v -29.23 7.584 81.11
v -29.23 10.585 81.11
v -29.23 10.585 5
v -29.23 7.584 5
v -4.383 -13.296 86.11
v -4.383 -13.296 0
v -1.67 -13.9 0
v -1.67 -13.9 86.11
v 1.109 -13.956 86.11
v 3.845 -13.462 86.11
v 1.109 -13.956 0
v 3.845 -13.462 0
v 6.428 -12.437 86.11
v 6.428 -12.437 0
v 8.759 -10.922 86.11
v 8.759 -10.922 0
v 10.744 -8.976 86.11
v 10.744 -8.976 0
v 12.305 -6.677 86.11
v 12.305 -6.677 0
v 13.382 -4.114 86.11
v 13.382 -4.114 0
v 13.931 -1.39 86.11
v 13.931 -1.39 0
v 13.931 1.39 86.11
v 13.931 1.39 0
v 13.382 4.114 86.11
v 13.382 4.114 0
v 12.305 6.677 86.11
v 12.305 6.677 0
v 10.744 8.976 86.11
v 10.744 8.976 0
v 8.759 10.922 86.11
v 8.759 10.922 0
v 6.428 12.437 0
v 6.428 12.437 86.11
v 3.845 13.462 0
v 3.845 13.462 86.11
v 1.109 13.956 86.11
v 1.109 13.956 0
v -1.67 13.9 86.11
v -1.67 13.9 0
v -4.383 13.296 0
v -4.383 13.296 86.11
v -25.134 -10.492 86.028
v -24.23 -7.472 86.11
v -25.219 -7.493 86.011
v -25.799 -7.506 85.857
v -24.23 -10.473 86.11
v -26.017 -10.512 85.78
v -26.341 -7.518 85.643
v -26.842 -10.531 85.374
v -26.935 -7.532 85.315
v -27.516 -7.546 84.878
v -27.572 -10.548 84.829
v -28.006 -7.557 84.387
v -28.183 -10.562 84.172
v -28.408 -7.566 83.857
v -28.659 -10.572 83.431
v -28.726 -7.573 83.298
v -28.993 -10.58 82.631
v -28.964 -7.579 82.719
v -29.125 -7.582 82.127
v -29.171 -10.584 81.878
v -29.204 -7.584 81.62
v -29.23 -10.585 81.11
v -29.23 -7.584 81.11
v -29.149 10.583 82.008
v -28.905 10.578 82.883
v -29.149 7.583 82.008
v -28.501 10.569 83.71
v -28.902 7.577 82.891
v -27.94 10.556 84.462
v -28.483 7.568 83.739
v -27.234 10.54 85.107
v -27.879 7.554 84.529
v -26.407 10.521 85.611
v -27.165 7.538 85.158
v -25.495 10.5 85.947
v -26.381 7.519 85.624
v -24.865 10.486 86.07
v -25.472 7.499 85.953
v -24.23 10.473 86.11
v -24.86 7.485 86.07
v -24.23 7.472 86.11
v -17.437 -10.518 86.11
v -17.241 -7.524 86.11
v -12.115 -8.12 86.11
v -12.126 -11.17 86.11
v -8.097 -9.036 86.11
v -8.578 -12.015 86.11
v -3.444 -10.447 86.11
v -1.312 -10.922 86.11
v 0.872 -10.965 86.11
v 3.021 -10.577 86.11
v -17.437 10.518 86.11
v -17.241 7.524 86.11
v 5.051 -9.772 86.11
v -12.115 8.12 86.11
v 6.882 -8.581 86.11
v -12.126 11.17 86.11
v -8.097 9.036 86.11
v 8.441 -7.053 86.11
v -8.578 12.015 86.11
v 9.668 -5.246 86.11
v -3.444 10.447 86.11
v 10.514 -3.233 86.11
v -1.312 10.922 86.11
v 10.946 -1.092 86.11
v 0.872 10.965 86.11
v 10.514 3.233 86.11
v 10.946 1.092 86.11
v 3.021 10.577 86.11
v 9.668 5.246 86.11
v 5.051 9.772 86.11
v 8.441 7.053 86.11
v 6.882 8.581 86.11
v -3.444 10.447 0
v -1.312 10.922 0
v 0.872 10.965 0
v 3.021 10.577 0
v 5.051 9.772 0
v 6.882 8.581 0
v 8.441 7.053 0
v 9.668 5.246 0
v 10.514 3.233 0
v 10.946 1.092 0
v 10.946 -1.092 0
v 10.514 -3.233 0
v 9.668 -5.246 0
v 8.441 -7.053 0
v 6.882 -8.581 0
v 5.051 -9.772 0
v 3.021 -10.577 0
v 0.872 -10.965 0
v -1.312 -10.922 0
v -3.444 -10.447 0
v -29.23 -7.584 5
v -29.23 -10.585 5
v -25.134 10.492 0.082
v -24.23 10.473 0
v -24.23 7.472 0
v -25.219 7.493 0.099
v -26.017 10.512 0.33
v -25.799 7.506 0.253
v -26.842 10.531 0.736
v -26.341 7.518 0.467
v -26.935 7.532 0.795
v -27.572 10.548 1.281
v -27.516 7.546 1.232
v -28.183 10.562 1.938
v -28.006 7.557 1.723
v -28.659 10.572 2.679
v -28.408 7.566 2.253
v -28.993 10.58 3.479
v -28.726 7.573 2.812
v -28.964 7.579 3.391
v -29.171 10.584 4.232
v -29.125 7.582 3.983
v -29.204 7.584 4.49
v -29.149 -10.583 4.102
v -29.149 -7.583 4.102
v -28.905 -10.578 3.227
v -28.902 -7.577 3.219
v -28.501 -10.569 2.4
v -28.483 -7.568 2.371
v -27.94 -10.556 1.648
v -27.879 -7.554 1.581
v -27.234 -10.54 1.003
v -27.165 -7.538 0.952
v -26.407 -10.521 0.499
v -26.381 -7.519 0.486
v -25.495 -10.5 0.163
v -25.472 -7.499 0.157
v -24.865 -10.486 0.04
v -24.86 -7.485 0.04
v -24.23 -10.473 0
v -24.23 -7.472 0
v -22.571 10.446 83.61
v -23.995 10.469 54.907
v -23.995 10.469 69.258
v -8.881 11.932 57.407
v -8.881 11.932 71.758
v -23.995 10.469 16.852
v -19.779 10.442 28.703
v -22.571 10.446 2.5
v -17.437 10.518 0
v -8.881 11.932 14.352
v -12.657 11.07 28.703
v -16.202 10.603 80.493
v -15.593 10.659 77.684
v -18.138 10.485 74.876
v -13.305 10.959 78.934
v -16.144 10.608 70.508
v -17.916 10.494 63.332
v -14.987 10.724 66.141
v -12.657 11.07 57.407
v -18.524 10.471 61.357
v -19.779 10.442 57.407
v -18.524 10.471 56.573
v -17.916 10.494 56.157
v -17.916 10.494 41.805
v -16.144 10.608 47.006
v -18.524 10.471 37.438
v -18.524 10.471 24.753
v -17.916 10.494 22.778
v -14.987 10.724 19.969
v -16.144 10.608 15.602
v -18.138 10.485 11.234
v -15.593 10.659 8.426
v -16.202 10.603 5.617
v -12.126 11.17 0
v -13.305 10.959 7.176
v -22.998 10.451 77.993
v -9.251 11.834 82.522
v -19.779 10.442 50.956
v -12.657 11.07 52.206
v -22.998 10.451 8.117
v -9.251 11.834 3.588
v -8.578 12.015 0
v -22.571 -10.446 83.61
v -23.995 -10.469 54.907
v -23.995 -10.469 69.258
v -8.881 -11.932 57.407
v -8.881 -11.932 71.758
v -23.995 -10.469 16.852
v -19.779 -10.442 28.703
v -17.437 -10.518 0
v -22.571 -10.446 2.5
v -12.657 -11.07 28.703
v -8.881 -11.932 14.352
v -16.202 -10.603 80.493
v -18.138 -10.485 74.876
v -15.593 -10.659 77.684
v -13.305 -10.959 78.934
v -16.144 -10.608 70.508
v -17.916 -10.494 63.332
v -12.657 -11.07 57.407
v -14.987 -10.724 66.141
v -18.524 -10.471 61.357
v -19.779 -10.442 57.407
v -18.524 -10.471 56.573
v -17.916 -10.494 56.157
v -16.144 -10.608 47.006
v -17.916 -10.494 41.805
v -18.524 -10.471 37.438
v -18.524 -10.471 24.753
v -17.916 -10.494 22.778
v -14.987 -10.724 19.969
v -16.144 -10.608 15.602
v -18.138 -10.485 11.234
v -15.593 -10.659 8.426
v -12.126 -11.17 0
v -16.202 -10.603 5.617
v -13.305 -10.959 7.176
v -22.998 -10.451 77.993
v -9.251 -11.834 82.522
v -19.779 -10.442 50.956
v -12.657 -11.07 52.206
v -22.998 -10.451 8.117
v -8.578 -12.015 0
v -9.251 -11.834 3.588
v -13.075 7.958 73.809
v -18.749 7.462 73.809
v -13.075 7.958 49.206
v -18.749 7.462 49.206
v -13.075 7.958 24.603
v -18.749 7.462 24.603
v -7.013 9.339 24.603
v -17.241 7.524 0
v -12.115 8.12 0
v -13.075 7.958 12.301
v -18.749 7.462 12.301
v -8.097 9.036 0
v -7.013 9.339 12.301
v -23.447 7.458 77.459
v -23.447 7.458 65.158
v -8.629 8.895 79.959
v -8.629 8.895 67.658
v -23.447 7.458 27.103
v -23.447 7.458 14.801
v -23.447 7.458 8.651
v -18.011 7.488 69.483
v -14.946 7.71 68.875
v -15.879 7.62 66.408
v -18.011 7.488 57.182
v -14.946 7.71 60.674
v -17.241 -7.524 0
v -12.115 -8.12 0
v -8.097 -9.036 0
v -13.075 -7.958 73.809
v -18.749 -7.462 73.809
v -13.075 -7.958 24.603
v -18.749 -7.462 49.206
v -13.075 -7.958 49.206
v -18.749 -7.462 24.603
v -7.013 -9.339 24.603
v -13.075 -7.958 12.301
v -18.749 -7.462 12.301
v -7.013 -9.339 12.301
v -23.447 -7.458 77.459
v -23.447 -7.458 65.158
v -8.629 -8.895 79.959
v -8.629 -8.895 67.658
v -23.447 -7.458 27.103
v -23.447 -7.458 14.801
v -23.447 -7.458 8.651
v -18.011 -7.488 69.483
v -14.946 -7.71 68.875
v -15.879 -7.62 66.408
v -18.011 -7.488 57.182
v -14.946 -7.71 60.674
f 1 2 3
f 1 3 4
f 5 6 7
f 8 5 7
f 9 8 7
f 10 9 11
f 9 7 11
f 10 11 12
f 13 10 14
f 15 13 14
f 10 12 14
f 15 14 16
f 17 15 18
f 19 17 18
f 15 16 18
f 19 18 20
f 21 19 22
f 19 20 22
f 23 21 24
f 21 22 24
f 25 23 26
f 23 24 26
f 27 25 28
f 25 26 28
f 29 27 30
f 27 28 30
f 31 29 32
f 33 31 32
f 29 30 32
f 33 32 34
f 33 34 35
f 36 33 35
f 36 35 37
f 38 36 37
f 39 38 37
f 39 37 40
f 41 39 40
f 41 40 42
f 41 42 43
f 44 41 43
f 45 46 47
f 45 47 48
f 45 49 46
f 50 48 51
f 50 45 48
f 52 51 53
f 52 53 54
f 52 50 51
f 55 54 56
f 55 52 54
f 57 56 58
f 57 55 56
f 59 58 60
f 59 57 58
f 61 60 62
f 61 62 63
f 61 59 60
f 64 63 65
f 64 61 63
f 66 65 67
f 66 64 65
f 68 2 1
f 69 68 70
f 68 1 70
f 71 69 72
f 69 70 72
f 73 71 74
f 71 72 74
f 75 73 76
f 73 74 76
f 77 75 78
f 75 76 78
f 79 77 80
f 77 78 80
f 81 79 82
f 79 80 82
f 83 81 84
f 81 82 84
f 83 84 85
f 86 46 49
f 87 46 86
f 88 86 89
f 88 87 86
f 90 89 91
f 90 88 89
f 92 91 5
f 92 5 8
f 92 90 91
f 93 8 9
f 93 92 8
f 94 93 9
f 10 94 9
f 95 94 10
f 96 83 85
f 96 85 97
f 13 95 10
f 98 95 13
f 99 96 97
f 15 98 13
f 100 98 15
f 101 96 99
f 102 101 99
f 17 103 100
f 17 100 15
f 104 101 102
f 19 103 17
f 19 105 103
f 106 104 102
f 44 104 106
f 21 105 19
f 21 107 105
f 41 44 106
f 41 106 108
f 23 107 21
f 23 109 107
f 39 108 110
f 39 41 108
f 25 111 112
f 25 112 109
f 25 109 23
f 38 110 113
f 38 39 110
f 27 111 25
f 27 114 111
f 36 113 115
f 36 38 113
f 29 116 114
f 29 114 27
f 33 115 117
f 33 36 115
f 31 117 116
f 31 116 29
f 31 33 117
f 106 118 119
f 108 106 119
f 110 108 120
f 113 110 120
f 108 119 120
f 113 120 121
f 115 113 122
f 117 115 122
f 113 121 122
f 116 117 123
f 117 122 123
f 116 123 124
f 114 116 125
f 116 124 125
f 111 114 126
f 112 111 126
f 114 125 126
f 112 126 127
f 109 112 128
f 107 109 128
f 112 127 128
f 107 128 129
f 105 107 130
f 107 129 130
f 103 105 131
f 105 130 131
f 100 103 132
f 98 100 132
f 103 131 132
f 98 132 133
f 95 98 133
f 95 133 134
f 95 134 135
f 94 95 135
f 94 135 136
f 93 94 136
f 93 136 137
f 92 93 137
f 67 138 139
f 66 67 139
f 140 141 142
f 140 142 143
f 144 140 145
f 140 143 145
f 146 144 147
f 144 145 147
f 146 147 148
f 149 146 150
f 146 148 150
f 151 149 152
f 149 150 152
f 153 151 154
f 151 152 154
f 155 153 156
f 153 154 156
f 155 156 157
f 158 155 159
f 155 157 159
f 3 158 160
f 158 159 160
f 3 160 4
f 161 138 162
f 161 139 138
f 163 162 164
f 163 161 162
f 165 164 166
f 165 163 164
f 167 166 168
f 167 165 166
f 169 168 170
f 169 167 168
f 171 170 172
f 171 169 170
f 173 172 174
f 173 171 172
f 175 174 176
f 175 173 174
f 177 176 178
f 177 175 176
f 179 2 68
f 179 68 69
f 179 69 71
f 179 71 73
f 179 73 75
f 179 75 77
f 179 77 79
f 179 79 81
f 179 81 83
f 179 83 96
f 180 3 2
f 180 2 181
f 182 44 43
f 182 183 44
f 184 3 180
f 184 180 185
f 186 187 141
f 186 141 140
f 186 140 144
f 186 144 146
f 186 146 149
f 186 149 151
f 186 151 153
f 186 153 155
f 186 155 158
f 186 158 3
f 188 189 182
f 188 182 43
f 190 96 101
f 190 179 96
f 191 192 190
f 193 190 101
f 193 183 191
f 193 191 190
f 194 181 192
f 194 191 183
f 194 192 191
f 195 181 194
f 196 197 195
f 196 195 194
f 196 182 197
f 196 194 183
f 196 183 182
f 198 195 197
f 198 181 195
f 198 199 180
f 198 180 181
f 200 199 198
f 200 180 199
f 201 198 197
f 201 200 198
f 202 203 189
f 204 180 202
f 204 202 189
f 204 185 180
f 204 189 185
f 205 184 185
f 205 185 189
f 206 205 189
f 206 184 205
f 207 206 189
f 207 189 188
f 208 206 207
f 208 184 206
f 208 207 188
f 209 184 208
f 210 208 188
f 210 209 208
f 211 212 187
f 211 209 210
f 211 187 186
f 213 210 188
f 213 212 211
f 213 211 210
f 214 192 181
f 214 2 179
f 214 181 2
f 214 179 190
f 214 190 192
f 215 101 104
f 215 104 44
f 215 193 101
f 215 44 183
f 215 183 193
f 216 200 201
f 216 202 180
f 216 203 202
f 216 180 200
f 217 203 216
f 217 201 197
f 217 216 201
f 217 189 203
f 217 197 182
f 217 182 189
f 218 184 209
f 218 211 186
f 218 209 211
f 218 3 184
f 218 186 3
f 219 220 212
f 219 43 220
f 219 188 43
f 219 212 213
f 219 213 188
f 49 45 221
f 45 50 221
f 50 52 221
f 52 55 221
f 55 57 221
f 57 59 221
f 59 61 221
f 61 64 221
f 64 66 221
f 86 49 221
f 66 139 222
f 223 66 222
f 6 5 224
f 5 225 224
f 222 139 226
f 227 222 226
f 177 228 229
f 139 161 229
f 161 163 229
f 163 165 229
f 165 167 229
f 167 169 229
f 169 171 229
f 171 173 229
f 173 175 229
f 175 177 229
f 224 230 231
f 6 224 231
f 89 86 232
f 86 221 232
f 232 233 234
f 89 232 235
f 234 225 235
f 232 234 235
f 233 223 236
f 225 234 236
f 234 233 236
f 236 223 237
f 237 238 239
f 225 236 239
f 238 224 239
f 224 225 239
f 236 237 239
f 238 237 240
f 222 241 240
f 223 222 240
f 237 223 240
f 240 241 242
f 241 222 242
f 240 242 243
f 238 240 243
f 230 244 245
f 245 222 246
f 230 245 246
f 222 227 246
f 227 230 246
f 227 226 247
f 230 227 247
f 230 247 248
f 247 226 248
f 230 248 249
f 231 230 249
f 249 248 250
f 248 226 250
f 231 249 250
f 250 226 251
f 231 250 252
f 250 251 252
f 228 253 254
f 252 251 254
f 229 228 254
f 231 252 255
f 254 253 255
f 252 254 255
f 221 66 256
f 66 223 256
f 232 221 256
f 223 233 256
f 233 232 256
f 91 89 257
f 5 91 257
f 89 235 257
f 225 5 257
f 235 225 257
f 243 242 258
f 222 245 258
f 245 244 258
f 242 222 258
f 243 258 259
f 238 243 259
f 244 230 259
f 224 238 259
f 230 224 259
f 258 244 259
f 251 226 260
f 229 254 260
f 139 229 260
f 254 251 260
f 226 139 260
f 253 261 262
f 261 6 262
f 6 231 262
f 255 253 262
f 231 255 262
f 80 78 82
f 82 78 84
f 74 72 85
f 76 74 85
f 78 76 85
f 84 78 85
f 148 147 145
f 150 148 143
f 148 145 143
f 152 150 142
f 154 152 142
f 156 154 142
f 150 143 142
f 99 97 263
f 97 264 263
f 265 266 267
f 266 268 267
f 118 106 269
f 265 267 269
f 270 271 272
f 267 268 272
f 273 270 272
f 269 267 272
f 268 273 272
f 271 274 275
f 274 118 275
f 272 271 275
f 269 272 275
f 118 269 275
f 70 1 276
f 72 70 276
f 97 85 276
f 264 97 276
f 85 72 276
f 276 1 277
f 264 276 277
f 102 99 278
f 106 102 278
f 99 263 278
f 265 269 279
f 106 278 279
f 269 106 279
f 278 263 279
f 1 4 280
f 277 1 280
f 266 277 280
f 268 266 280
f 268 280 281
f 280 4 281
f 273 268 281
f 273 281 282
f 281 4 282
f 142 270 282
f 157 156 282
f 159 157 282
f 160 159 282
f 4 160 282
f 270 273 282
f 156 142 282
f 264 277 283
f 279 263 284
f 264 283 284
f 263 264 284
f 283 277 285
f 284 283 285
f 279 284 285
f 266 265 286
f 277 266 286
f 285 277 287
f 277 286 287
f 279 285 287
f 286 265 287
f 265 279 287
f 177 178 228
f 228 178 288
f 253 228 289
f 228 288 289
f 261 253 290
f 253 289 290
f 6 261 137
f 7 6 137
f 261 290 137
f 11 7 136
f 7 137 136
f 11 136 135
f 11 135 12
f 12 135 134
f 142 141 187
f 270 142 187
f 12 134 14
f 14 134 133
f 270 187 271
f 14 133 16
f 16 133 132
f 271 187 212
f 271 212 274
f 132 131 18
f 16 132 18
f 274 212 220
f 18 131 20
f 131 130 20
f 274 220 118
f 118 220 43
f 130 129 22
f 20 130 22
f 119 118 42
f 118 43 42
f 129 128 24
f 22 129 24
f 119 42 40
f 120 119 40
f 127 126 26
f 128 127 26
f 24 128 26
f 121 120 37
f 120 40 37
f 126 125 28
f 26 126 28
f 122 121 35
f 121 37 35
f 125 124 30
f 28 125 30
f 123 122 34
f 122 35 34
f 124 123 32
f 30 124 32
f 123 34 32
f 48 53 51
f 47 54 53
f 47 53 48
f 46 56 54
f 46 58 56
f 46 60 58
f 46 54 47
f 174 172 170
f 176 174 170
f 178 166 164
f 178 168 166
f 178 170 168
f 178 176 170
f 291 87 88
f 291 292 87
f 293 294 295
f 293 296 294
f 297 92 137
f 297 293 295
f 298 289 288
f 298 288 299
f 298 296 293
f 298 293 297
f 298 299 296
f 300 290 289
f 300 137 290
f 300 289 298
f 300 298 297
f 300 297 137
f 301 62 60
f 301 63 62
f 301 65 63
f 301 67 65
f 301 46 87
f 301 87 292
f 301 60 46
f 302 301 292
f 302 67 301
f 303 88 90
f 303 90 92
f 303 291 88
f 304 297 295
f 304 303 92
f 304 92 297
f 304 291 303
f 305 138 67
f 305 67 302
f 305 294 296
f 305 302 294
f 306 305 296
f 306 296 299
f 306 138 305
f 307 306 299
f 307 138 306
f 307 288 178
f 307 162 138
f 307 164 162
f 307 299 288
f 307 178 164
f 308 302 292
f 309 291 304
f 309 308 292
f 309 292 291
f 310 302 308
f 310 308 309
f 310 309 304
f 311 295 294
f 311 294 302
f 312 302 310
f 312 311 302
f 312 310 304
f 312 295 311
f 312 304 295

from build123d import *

# Parameters (mm, degrees)
F1_DEPTH = 86.11
F2_R     = 5
F3_R     = 5
F4_R     = 5


# Not quite as in the source:
# - the dataset's text gives a spline's control points without its knots; the knots are read off the source's solid


with BuildPart() as f1:
    # F0 (on Top) → F1 (new body)
    with BuildSketch(Plane.XY):
        with BuildLine():
            add(Edge.make_bspline(
                [(-29.23, -10.585), (-17.4530325989, -10.3312646709), (-14.3938385965, -9.9964864644), (-4.3826738853, -13.2963216573)],
                knots=[0, 0, 0, 0, 24.9948170664, 24.9948170664, 24.9948170664, 24.9948170664], degree=3))
            ThreePointArc((-4.3826738853, -13.2963216573), (14, 0), (-4.3826738853, 13.2963216573))
            add(Edge.make_bspline(
                [(-29.23, 10.585), (-17.4530325989, 10.3312646709), (-14.3938385965, 9.9964864644), (-4.3826738853, 13.2963216573)],
                knots=[0, 0, 0, 0, 24.9948170664, 24.9948170664, 24.9948170664, 24.9948170664], degree=3))
            Line((-29.23, 10.585), (-29.23, 7.5843010349))
            add(Edge.make_bspline(
                [(-29.2300000018, 7.5843009524), (-26.3264289999, 7.5214949579), (-22.7397747479, 7.4189906626), (-18.7158912708, 7.4405712538), (-15.8829489535, 7.5882179461), (-13.0899113875, 7.919906296), (-10.2045998481, 8.4774191522), (-7.0815280556, 9.2907869197), (-4.7236583696, 10.0251594583), (-3.443529459, 10.447109806)],
                knots=[0.0018385431, 0.0018385431, 0.0018385431, 0.0018385431, 0.25, 0.375, 0.5, 0.625, 0.75, 0.875, 1, 1, 1, 1], degree=3))
            ThreePointArc((-3.443529459, 10.447109806), (10.9999999288, 0), (-3.443529459, -10.447109806))
            add(Edge.make_bspline(
                [(-29.2300000018, -7.5843009524), (-26.3264289999, -7.5214949579), (-22.7397747479, -7.4189906626), (-18.7158912708, -7.4405712538), (-15.8829489535, -7.5882179461), (-13.0899113875, -7.919906296), (-10.2045998481, -8.4774191522), (-7.0815280556, -9.2907869197), (-4.7236583696, -10.0251594583), (-3.443529459, -10.447109806)],
                knots=[0.0018385431, 0.0018385431, 0.0018385431, 0.0018385431, 0.25, 0.375, 0.5, 0.625, 0.75, 0.875, 1, 1, 1, 1], degree=3))
            Line((-29.23, -7.5843010349), (-29.23, -10.585))
        make_face()
    extrude(amount=F1_DEPTH)

    # F2
    f2_edges = [f1.edges().sort_by_distance(p)[0] for p in [
        (-29.23, -9.084651, 0),
    ]]
    fillet(f2_edges, radius=F2_R)

    # F3
    f3_edges = [f1.edges().sort_by_distance(p)[0] for p in [
        (-29.23, 9.084651, 0),
    ]]
    fillet(f3_edges, radius=F3_R)

    # F4
    f4_edges = [f1.edges().sort_by_distance(p)[0] for p in [
        (-29.23, -9.084651, 86.11),
        (-29.23, 9.084651, 86.11),
    ]]
    fillet(f4_edges, radius=F4_R)


solid = f1.part
